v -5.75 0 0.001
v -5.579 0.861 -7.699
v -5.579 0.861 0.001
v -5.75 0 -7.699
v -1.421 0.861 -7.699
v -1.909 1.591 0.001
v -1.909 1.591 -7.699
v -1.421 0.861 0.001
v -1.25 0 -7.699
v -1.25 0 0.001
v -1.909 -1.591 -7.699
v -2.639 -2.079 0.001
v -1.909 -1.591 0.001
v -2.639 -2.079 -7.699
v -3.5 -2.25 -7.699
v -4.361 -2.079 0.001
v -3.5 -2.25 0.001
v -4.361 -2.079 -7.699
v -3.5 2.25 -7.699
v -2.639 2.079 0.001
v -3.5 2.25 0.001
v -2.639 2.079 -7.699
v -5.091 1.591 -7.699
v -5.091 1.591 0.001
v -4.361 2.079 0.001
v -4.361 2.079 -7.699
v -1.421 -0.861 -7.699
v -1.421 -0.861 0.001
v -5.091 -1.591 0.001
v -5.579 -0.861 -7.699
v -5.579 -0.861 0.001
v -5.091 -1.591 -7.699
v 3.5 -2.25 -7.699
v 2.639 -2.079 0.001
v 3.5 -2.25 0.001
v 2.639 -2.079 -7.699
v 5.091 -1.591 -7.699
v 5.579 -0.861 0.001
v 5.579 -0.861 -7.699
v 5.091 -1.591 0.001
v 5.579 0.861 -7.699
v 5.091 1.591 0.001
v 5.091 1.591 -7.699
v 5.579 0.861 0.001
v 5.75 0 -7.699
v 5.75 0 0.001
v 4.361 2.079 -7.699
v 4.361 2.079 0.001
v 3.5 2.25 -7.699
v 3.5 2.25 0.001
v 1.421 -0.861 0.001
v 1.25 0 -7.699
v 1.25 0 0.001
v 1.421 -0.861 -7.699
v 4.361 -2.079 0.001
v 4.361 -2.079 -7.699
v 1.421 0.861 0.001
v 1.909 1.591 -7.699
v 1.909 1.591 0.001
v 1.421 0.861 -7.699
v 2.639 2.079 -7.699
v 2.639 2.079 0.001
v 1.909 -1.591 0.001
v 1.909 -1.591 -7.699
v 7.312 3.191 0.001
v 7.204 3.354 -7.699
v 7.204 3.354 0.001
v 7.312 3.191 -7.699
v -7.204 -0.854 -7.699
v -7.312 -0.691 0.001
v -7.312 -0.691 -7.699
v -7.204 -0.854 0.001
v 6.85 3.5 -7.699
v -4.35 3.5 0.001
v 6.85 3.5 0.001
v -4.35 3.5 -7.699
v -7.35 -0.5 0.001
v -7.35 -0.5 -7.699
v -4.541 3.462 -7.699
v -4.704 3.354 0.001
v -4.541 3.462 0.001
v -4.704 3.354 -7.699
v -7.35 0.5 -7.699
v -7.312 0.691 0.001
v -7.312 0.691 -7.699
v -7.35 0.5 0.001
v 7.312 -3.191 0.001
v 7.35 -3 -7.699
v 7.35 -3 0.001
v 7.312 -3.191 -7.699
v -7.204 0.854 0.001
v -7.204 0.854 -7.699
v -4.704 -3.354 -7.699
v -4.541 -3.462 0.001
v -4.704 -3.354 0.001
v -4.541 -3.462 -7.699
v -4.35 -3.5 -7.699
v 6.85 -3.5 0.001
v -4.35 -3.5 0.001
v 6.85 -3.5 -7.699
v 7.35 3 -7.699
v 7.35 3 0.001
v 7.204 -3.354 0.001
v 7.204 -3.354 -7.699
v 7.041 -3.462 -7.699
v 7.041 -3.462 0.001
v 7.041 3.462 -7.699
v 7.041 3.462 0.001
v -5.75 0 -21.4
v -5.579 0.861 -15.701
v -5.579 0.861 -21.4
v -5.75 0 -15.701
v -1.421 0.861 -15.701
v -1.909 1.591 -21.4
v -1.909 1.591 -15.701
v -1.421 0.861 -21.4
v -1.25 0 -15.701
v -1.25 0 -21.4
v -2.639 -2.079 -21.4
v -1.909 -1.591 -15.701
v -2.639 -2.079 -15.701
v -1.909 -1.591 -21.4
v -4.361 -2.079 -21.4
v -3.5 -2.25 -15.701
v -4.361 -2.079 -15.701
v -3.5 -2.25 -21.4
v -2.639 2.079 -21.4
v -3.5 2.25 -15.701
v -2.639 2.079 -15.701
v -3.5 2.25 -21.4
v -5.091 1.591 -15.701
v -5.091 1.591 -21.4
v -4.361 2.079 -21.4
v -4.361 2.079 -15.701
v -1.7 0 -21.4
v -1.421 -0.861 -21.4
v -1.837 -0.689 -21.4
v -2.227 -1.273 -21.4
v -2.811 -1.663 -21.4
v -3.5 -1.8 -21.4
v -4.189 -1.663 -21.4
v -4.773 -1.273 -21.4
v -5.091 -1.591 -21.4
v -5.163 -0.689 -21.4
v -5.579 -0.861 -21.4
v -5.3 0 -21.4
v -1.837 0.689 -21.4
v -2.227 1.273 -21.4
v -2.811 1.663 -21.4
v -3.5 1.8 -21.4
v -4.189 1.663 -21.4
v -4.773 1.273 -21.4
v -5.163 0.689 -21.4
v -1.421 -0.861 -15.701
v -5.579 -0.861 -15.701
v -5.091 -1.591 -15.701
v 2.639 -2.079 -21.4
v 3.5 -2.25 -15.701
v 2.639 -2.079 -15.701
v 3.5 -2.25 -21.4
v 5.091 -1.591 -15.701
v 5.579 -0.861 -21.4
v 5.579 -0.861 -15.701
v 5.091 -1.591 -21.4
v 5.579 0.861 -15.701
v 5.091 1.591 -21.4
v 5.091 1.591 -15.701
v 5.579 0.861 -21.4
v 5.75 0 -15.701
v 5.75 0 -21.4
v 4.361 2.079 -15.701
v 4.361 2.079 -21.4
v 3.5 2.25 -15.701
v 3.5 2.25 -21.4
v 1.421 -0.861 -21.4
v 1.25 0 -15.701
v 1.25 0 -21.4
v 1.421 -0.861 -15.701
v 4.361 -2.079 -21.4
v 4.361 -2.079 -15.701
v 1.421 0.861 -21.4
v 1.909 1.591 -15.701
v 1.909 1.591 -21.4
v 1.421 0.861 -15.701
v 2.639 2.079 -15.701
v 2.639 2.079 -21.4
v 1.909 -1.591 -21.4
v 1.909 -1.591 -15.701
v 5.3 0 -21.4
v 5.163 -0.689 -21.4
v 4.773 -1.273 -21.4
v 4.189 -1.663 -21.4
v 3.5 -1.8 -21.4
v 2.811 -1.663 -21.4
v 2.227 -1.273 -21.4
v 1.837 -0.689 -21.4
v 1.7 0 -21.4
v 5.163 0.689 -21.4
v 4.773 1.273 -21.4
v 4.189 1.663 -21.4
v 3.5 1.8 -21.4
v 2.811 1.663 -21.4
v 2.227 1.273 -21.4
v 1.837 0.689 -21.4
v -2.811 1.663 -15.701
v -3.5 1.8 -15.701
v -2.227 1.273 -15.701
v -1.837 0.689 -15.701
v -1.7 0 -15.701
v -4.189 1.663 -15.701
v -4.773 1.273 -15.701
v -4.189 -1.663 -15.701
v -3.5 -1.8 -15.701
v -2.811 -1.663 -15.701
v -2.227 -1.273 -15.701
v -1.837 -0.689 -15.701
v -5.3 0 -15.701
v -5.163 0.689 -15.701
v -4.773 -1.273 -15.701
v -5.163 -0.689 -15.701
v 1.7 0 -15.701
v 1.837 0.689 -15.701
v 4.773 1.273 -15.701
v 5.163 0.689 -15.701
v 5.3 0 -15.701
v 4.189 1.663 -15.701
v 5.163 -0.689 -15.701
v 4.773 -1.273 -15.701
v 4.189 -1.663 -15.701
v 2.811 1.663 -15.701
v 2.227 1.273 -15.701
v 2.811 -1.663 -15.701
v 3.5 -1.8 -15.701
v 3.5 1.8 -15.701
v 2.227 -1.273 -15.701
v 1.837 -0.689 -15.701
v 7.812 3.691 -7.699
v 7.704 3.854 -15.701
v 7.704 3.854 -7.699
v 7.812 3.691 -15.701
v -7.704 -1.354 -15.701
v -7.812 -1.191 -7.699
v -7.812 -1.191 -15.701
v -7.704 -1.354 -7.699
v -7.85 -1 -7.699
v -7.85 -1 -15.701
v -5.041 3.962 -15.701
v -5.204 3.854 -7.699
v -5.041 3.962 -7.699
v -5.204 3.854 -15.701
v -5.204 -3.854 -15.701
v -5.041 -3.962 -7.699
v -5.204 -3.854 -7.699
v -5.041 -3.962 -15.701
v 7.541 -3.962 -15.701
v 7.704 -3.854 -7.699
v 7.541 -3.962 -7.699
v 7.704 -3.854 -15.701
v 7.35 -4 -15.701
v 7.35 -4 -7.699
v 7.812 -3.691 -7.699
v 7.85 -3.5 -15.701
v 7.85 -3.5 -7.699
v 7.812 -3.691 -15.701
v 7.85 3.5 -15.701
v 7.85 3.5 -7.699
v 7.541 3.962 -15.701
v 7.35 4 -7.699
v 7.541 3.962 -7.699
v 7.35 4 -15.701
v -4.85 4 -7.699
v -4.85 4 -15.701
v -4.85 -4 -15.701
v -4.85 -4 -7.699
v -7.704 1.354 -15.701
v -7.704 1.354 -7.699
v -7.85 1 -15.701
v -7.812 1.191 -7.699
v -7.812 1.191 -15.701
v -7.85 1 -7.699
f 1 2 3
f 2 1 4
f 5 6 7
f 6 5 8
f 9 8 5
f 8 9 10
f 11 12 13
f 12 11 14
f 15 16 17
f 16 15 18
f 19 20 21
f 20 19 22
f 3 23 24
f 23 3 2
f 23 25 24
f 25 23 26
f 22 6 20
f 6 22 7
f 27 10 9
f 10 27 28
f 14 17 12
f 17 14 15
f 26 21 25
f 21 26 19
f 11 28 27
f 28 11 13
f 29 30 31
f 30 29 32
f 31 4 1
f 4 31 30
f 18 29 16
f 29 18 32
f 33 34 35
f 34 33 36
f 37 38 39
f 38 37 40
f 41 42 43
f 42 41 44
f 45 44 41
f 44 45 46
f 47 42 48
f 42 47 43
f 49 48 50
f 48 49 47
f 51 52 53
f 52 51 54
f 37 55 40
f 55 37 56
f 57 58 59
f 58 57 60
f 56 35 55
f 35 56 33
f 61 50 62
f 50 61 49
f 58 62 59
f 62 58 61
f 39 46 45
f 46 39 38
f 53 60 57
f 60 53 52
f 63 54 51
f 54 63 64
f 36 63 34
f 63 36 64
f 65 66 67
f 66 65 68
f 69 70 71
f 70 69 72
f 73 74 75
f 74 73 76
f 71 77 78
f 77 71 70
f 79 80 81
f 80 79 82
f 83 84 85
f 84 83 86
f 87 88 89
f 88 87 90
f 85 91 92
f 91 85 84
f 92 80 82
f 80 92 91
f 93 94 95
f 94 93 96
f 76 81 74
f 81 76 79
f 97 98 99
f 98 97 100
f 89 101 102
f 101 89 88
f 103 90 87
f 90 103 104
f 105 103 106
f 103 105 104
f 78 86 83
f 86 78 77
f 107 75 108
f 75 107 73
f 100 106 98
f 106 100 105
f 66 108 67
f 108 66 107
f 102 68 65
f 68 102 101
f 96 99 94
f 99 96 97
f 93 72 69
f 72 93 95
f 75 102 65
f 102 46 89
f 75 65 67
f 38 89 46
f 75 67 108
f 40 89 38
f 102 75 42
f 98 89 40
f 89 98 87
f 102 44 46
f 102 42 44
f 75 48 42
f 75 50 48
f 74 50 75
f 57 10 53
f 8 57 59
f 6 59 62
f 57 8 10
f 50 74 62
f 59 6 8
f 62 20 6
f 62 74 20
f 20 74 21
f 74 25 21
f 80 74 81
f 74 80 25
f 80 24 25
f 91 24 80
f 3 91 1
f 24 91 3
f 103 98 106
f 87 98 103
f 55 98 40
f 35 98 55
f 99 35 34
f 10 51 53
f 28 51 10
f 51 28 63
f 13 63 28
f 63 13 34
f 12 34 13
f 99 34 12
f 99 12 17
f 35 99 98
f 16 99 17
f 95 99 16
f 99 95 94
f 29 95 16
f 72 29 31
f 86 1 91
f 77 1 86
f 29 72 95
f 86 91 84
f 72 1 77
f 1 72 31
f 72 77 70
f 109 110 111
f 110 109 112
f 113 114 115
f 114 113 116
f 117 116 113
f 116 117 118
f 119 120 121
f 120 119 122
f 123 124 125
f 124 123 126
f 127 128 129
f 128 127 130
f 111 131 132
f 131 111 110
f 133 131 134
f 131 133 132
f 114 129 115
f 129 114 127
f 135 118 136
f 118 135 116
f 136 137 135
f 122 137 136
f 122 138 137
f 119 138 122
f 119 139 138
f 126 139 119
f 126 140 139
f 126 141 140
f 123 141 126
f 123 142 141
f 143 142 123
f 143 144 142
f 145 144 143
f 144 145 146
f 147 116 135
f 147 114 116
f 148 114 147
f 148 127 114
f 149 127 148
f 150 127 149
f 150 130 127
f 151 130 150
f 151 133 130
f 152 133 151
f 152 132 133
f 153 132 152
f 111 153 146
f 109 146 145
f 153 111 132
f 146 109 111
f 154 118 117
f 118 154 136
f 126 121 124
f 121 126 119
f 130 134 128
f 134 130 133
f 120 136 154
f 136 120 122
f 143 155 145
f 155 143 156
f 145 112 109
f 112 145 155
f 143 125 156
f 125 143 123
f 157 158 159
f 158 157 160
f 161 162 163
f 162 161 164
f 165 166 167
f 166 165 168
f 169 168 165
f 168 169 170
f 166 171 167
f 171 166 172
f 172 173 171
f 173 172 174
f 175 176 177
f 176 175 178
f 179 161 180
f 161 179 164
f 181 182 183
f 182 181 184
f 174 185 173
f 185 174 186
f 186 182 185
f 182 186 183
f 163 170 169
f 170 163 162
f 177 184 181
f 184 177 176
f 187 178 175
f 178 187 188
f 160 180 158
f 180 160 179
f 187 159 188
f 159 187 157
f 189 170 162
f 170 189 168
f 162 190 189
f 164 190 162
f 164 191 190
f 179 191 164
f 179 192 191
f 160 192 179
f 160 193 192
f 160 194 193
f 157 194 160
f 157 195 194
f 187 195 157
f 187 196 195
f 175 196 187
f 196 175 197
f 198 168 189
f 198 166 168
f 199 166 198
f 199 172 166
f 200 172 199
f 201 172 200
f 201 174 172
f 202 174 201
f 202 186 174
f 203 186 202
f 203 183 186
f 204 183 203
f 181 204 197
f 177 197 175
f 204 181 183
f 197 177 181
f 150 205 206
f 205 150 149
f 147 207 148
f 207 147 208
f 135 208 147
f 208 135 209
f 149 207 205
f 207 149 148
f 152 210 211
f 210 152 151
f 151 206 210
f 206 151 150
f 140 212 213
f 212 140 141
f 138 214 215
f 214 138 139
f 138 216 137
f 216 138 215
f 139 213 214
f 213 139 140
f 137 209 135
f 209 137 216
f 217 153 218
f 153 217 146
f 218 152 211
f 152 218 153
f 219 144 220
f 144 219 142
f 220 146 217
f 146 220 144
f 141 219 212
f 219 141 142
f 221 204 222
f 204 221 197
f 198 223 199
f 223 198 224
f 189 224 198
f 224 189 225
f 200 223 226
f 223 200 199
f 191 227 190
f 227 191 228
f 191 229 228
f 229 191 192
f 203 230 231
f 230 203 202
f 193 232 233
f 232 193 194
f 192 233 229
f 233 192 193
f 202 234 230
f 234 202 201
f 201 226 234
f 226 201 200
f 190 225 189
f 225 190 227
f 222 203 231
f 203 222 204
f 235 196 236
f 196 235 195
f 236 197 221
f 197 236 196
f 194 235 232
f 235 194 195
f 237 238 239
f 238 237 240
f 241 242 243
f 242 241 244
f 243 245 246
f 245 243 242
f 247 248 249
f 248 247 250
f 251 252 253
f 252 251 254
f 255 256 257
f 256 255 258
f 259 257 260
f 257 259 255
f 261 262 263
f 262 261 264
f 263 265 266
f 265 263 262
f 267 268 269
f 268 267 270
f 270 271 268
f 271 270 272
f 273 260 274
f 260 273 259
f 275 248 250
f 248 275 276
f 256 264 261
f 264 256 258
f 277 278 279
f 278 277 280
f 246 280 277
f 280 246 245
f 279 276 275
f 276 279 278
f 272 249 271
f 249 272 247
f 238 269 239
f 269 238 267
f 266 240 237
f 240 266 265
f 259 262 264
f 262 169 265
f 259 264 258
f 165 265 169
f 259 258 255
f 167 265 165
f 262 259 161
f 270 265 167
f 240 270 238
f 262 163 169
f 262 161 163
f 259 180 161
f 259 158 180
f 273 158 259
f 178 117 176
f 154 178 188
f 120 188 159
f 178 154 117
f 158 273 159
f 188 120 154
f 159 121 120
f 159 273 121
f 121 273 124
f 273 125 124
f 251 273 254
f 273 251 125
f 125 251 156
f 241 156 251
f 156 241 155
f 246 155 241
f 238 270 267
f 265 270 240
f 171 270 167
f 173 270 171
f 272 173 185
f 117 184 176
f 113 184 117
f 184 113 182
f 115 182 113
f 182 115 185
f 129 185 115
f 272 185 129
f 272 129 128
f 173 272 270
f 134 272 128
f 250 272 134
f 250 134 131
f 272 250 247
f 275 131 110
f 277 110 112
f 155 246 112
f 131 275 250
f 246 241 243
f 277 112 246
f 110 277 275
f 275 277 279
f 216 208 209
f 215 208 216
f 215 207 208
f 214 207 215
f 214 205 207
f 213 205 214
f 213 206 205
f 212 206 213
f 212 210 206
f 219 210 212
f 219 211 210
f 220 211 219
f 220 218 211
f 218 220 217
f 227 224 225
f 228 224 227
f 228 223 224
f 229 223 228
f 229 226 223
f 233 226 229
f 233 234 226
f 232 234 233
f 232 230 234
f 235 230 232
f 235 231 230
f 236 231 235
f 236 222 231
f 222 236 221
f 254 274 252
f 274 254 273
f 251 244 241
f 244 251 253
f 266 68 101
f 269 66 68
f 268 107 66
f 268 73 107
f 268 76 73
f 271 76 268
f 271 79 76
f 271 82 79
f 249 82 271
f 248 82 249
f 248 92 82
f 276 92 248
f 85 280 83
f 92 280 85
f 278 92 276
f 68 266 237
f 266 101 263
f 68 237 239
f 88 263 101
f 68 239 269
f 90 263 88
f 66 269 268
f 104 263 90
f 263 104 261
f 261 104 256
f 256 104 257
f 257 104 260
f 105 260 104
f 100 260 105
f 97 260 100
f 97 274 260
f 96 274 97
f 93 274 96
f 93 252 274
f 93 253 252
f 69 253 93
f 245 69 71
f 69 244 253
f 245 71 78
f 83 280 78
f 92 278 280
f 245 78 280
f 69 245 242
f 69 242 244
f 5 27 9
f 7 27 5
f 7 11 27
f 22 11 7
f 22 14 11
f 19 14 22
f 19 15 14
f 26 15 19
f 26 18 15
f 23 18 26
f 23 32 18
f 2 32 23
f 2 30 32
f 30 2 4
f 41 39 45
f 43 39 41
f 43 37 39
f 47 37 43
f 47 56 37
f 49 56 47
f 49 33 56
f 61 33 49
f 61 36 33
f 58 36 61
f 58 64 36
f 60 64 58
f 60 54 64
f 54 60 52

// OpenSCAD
e=.001;
$fn=16;

xt60_w=15.7;
xt60_h=8;
xt60f_d = 15.7;
xt60f_base_d = 8;
xt60_combined_d=24.1;
xt60_pitch=7;
xt60_chamfer=2.5;
xt60f_pin_d=5.7;
xt60m_pin_d=4.7;
xt60_pin_w=4.5;
xt60_hole_w=4.5;
xt60_corner=.5;

module xt_pins(width, height, pitch)
{
	for (p=[-pitch/2, pitch/2])
	translate([p,0,0])
	cylinder(h=height, r=width/2);
}

module xt_base(w, h, d, chamfer, corner, margin=0, e=0)
{
	w = w-2*corner;
	h = h-2*corner;
	r = corner+margin;
	translate([0,0,-e])
    linear_extrude(d+2*e)
	hull()
    for (p=[ [w/2,-h/2],
	         [-w/2+chamfer, -h/2],
	         [-w/2, -h/2+chamfer],
	         [-w/2, h/2-chamfer],
	         [-w/2+chamfer, h/2],
	         [w/2, h/2]
	])
	translate(p)
	circle(r);
}

module xt60_combined_shell_cutout(margin=0,f_margin=-1,m_margin=-1, e=0)
{
	b=1; 
	xt_base(xt60_w, xt60_h, xt60_combined_d, xt60_chamfer, xt60_corner, margin, e);
	if (f_margin > margin)
	hull()
	{
		xt_base(xt60_w, xt60_h, xt60f_base_d, xt60_chamfer, xt60_corner, f_margin, e);
		translate([0,0,xt60f_base_d])
		xt_base(xt60_w, xt60_h, f_margin-margin, xt60_chamfer, xt60_corner, margin, e);
	}
	if (m_margin > margin)
	hull()
	{
		translate([0,0,xt60f_base_d-(m_margin-margin)])
		xt_base(xt60_w, xt60_h, m_margin-margin, xt60_chamfer, xt60_corner, margin, e);
		translate([0,0,xt60f_base_d])
		xt_base(xt60_w, xt60_h, xt60_combined_d-xt60f_base_d, xt60_chamfer, xt60_corner, m_margin, e);
	}
}


module xt60_combined_cutout(margin=0,f_margin=-1,m_margin=-1, e=0)
{
	b=1; 
	xt60_combined_shell_cutout(margin,f_margin,m_margin, e);

	translate([0, 0, -xt60f_pin_d-margin])
	xt_pins(xt60_pin_w+margin*2, xt60f_pin_d+b+margin, xt60_pitch);

	translate([0, 0, xt60_combined_d-b])
	xt_pins(xt60_pin_w+margin*2, xt60m_pin_d+b+margin, xt60_pitch);
}

module xt60f_cutout(margin=0,f_margin=-1,m_margin=-1,e=0)
{
	translate([0,0,-xt60f_d])
	xt60_combined_cutout(margin,f_margin,m_margin,e);
}

module xt60f_shell_cutout(margin=0,f_margin=-1,m_margin=-1,e=0)
{
	translate([0,0,-xt60f_d])
	xt60_combined_shell_cutout(margin,f_margin,m_margin,e);
}

module xt60f()
{
	b=1;
	translate([0,0,-xt60f_d])
	{
		xt_base(xt60_w, xt60_h, xt60f_base_d, xt60_chamfer, xt60_corner, 0, e);

		translate([0,0,b])
		difference()
		{
			xt_base(xt60_w-2*xt60_corner, xt60_h-2*xt60_corner, xt60f_d-b, xt60_chamfer, xt60_corner, 0, e);
			xt_pins(xt60_hole_w, xt60f_d, xt60_pitch);

		}

		difference()
		{
			translate([0, 0, -xt60f_pin_d])
			xt_pins(xt60_pin_w, xt60f_pin_d+b, xt60_pitch);

			translate([0, 0, -xt60f_pin_d-b])
			xt_pins(xt60_pin_w*.8, xt60f_pin_d+b, xt60_pitch);
		}
	}
}

xt60f();
%xt60f_cutout(margin=.4,m_margin=1,e=e);
